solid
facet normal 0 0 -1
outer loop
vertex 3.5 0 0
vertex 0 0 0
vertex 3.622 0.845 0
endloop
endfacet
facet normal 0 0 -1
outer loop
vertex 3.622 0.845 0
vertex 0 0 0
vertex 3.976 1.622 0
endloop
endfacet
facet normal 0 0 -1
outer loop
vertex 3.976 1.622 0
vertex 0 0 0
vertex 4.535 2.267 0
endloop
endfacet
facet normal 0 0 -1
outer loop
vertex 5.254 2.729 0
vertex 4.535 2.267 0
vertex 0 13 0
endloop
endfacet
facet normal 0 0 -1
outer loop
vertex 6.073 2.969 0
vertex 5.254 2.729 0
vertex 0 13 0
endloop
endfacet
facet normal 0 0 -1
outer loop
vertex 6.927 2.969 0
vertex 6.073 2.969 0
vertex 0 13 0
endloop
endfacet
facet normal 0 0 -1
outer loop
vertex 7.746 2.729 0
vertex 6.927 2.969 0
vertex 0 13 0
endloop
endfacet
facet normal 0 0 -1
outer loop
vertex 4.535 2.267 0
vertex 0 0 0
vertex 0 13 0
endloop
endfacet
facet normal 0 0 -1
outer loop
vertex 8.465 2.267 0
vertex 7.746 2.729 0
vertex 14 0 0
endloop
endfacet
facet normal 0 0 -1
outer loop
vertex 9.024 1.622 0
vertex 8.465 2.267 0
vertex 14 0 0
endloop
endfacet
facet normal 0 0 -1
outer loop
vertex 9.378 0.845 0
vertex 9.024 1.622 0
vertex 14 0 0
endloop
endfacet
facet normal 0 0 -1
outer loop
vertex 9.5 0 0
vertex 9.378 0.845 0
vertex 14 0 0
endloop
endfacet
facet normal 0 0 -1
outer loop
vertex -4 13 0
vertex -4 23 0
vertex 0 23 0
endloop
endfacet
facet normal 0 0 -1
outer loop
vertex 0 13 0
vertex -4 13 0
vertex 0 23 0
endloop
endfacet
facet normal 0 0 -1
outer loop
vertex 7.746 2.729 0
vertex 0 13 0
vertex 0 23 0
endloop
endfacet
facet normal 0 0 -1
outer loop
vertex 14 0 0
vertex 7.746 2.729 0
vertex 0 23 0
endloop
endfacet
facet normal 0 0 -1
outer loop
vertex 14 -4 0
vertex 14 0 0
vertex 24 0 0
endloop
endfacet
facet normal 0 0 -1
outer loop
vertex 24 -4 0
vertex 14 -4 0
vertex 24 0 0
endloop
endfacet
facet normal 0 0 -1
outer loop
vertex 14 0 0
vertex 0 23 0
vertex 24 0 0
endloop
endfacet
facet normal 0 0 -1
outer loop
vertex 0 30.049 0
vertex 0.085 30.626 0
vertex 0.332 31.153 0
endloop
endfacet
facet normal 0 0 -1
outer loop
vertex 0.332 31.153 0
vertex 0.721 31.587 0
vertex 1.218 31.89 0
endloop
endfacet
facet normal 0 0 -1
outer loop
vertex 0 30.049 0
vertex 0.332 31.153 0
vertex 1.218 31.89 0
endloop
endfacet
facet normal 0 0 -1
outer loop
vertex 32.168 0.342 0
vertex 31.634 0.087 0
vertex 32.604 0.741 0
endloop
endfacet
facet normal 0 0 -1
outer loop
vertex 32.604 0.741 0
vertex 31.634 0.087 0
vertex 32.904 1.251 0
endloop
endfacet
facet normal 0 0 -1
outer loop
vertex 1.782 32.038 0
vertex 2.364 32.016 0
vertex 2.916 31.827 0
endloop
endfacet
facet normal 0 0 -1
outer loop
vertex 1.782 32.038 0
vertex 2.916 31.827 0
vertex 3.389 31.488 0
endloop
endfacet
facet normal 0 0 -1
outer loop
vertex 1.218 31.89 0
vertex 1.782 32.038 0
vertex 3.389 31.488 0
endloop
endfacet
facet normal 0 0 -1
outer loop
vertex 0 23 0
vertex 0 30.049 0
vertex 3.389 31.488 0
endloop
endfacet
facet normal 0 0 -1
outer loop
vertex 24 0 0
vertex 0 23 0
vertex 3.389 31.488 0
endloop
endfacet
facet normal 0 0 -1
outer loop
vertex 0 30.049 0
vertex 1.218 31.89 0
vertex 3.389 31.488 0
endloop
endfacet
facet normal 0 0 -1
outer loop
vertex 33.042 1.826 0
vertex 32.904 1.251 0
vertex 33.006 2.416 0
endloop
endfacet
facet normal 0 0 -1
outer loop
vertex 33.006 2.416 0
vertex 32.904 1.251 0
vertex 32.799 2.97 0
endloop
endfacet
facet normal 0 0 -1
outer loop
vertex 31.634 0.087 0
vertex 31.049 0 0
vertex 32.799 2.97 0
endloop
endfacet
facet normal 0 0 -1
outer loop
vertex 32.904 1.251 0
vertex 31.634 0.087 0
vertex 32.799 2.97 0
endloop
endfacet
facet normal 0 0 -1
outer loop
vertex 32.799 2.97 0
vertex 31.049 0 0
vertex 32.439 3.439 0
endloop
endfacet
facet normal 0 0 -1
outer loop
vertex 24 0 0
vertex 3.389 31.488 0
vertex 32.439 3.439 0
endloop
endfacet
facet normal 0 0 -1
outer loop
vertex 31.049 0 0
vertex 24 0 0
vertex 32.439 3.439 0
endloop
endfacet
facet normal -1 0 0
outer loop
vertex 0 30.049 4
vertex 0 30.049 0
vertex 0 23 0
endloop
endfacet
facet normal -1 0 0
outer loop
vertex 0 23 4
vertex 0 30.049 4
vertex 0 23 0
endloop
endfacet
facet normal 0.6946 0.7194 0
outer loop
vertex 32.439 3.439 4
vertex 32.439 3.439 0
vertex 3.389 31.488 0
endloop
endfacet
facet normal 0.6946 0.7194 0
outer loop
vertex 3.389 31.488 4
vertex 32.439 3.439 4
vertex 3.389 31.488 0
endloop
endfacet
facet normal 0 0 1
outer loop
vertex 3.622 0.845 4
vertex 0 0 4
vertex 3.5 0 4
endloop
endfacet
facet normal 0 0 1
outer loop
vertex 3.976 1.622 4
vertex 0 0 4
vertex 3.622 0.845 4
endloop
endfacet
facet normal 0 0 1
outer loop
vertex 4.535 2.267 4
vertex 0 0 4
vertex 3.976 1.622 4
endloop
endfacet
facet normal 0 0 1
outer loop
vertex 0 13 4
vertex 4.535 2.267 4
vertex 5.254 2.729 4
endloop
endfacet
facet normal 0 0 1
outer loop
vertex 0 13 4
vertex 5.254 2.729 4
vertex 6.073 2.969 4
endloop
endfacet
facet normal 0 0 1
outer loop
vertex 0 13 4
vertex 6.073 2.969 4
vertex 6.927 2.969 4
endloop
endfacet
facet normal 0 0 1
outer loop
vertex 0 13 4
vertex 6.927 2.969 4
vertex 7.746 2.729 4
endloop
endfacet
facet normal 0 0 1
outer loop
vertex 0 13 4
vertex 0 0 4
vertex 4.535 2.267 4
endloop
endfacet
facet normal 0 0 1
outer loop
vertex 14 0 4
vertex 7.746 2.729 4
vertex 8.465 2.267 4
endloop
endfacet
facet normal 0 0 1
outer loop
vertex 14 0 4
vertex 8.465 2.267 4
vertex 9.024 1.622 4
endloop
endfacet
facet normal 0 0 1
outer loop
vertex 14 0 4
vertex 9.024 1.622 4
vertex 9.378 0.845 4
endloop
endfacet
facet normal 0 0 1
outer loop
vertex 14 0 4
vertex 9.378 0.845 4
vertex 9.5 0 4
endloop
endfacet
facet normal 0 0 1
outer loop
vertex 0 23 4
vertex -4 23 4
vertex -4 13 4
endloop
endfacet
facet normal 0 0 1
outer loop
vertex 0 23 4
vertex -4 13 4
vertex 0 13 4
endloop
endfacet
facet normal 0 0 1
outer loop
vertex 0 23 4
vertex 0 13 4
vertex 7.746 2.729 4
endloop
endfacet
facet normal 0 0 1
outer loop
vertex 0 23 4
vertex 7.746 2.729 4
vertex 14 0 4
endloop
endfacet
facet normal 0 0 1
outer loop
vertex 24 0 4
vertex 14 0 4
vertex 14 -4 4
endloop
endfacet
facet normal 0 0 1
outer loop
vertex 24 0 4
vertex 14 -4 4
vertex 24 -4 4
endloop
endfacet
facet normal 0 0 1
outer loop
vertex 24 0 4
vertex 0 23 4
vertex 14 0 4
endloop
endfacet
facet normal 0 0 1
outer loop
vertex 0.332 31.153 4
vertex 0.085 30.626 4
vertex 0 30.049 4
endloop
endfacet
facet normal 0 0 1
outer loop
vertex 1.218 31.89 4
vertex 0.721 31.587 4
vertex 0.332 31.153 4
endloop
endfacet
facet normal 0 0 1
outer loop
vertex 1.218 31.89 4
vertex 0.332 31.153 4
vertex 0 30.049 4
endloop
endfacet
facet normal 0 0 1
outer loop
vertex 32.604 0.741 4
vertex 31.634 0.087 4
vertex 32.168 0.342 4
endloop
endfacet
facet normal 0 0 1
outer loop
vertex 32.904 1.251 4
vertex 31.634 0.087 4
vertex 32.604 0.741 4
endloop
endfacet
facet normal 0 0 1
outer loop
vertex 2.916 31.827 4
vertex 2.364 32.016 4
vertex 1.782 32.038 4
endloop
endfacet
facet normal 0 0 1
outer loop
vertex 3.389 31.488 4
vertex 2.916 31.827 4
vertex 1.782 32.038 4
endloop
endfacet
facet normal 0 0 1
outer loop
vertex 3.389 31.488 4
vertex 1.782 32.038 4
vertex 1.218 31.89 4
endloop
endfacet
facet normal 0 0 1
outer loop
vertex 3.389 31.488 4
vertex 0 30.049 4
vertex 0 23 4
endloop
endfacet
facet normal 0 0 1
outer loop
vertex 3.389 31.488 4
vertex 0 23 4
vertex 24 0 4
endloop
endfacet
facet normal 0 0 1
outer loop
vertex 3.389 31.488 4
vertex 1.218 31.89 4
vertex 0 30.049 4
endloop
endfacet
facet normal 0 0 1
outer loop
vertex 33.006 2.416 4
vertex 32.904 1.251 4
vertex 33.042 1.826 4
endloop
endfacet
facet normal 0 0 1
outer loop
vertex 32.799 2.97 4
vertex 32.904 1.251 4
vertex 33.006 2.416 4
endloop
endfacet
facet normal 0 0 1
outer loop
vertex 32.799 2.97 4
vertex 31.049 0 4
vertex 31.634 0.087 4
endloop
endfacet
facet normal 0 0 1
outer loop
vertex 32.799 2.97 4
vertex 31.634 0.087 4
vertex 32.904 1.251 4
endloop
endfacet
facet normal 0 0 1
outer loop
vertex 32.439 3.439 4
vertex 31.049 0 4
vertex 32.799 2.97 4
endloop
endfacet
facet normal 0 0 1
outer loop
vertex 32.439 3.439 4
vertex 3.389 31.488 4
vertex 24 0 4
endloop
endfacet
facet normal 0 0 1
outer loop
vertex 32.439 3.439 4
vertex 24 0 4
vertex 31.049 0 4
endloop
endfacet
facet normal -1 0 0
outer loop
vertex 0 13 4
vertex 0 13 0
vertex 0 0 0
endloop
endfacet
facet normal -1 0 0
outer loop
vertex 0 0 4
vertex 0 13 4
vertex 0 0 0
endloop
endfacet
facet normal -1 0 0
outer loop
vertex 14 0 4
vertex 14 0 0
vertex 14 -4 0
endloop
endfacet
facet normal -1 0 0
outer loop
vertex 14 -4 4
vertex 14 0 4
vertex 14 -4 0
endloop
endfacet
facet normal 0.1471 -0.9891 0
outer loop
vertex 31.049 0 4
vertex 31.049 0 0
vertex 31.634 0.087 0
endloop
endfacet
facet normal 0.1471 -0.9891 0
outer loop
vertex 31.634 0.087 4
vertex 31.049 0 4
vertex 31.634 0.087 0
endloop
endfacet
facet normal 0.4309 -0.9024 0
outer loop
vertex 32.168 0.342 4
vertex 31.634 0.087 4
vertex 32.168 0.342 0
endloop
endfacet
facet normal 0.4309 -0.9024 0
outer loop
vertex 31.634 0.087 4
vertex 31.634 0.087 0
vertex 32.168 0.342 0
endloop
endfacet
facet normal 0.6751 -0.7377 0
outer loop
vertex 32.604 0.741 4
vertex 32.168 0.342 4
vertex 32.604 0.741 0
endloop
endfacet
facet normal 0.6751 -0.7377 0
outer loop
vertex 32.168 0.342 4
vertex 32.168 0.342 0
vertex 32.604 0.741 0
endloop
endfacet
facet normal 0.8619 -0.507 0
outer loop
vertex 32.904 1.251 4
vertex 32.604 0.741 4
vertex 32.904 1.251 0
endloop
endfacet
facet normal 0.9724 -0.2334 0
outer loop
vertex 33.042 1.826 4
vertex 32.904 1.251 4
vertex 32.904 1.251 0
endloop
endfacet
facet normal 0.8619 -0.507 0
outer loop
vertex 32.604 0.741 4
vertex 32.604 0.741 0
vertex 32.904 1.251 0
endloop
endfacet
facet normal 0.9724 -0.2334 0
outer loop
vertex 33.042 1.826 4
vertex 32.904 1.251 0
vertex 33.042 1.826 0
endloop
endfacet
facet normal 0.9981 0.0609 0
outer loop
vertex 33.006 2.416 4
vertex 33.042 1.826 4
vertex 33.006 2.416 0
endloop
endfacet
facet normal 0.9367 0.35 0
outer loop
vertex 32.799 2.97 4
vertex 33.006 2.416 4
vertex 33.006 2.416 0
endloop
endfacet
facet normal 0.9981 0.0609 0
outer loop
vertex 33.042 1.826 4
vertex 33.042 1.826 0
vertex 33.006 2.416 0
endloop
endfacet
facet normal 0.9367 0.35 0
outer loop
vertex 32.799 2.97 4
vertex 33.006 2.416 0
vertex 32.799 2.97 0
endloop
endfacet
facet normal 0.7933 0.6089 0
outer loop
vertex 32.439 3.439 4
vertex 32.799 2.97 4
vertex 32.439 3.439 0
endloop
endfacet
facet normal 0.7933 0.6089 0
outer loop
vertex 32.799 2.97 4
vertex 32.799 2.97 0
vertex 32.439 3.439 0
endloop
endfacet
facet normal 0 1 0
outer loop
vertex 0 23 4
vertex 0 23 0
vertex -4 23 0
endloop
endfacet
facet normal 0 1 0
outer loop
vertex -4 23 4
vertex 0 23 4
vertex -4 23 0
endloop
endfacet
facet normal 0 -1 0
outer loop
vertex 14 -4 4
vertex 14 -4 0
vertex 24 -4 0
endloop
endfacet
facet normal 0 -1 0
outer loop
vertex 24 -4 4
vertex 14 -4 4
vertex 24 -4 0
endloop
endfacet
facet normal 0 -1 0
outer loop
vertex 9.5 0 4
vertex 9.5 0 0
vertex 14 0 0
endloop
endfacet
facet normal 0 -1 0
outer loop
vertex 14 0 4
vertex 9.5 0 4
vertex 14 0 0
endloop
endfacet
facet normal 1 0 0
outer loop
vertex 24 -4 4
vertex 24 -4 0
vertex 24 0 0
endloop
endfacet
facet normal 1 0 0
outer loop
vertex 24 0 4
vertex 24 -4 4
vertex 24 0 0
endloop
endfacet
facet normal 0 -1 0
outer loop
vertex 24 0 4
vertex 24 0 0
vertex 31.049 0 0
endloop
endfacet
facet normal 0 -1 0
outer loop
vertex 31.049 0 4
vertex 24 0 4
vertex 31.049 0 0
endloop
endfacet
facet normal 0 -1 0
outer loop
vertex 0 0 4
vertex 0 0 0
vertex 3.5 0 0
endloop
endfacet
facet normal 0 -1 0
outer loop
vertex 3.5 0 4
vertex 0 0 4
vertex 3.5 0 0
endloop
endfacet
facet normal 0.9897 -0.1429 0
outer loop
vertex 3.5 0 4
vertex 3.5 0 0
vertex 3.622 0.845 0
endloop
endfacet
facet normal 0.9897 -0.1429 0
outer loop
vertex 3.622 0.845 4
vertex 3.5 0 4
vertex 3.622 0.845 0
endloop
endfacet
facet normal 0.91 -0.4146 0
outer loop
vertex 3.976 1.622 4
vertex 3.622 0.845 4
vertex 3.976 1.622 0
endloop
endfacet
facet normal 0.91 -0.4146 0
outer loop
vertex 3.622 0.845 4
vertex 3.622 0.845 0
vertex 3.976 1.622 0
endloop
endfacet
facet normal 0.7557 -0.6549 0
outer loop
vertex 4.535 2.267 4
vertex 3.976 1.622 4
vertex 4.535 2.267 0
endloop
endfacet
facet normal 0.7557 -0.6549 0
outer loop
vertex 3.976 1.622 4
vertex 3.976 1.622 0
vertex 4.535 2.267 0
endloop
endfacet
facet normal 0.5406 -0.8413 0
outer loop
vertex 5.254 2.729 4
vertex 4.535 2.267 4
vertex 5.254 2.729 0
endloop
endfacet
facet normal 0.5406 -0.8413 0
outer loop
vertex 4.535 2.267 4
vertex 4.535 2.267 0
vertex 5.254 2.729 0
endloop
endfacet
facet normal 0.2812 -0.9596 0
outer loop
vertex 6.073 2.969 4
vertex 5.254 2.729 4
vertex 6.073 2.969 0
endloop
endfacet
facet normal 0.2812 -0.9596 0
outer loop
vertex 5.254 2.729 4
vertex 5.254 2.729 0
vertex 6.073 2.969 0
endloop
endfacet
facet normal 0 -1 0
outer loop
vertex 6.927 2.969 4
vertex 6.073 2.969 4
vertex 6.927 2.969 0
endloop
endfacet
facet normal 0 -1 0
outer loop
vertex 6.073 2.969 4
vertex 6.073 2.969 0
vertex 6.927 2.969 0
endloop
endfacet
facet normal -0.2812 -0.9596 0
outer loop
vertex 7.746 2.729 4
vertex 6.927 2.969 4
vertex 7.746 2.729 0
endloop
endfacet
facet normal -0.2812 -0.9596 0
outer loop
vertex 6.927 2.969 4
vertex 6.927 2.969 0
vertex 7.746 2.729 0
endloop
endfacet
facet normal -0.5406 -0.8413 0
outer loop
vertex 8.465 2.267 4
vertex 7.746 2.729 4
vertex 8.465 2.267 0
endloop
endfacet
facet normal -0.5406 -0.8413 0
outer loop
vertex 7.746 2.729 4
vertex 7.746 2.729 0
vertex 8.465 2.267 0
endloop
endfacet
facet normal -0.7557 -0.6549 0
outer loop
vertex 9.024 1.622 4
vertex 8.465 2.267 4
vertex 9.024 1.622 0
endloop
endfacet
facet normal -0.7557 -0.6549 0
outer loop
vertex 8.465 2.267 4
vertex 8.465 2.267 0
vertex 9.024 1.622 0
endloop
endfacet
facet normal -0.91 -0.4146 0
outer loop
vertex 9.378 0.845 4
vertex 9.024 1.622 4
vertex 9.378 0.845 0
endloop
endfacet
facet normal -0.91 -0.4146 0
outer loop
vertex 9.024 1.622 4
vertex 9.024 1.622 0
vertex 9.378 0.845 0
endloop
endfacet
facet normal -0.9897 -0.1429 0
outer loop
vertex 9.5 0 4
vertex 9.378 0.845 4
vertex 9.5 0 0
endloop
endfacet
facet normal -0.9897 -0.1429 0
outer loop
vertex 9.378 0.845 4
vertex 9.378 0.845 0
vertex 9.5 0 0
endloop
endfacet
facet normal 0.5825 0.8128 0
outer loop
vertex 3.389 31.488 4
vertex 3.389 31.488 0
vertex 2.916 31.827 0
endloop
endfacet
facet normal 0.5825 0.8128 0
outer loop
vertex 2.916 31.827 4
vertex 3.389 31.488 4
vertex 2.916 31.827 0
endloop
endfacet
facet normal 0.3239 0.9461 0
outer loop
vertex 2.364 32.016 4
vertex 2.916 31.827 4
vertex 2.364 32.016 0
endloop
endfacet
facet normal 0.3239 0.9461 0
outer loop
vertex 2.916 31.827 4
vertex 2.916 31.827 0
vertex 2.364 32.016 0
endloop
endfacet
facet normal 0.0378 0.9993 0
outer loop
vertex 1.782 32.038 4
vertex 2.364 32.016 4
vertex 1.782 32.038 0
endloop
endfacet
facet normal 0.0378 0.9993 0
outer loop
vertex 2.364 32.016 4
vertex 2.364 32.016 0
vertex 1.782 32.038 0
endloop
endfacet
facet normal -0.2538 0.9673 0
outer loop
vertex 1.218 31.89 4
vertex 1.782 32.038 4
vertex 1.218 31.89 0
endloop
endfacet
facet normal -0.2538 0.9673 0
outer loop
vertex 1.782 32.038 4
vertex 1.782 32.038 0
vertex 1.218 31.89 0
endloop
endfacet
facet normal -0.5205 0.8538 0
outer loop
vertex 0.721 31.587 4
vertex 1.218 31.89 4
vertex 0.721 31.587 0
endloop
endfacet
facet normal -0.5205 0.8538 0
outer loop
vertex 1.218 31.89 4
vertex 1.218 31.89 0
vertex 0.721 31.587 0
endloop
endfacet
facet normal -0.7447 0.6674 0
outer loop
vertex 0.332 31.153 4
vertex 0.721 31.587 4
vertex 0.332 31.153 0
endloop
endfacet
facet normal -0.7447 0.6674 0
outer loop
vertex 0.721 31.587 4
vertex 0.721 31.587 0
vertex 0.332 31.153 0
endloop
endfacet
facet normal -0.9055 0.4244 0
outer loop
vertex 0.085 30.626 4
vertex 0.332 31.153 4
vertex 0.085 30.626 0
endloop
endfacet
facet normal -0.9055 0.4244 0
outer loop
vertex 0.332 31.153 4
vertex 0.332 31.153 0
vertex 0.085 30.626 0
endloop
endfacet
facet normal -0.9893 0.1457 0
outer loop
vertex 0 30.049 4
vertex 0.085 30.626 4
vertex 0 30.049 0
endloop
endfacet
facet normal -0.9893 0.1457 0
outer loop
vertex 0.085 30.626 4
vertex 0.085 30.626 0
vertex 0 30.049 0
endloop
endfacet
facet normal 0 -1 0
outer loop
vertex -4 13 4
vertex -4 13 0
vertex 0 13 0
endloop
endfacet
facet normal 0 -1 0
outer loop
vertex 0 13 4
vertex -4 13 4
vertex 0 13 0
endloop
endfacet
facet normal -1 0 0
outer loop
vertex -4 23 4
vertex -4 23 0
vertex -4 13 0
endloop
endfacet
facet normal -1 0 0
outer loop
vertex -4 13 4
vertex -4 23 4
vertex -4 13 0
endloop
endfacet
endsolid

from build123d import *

# Parameters (mm, degrees)
BOSS_EXTRUDE1_DEPTH = 4


with BuildPart() as part:
    # Sketch1 → Boss-Extrude1 (new body)
    with BuildSketch(Plane.XY):
        with BuildLine():
            Line((0, 0), (3.5, 0))
            ThreePointArc((3.5, 0), (6.5, 3), (9.5, 0))
            Line((9.5, 0), (14, 0))
            Line((14, 0), (14, -4))
            Line((14, -4), (24, -4))
            Line((24, -4), (24, 0))
            Line((24, 0), (31.049410002, 0))
            ThreePointArc((31.049410002, 0), (32.903799592, 1.250840974), (32.438642701, 3.438760754))
            Line((32.438642701, 3.438760754), (3.3892327, 31.488170756))
            ThreePointArc((3.3892327, 31.488170756), (1.218483973, 31.890396884), (0, 30.049410002))
            Line((0, 30.049410002), (0, 23))
            Line((0, 23), (-4, 23))
            Line((-4, 23), (-4, 13))
            Line((-4, 13), (0, 13))
            Line((0, 13), (0, 0))
        make_face()
    extrude(amount=BOSS_EXTRUDE1_DEPTH)


solid = part.part
